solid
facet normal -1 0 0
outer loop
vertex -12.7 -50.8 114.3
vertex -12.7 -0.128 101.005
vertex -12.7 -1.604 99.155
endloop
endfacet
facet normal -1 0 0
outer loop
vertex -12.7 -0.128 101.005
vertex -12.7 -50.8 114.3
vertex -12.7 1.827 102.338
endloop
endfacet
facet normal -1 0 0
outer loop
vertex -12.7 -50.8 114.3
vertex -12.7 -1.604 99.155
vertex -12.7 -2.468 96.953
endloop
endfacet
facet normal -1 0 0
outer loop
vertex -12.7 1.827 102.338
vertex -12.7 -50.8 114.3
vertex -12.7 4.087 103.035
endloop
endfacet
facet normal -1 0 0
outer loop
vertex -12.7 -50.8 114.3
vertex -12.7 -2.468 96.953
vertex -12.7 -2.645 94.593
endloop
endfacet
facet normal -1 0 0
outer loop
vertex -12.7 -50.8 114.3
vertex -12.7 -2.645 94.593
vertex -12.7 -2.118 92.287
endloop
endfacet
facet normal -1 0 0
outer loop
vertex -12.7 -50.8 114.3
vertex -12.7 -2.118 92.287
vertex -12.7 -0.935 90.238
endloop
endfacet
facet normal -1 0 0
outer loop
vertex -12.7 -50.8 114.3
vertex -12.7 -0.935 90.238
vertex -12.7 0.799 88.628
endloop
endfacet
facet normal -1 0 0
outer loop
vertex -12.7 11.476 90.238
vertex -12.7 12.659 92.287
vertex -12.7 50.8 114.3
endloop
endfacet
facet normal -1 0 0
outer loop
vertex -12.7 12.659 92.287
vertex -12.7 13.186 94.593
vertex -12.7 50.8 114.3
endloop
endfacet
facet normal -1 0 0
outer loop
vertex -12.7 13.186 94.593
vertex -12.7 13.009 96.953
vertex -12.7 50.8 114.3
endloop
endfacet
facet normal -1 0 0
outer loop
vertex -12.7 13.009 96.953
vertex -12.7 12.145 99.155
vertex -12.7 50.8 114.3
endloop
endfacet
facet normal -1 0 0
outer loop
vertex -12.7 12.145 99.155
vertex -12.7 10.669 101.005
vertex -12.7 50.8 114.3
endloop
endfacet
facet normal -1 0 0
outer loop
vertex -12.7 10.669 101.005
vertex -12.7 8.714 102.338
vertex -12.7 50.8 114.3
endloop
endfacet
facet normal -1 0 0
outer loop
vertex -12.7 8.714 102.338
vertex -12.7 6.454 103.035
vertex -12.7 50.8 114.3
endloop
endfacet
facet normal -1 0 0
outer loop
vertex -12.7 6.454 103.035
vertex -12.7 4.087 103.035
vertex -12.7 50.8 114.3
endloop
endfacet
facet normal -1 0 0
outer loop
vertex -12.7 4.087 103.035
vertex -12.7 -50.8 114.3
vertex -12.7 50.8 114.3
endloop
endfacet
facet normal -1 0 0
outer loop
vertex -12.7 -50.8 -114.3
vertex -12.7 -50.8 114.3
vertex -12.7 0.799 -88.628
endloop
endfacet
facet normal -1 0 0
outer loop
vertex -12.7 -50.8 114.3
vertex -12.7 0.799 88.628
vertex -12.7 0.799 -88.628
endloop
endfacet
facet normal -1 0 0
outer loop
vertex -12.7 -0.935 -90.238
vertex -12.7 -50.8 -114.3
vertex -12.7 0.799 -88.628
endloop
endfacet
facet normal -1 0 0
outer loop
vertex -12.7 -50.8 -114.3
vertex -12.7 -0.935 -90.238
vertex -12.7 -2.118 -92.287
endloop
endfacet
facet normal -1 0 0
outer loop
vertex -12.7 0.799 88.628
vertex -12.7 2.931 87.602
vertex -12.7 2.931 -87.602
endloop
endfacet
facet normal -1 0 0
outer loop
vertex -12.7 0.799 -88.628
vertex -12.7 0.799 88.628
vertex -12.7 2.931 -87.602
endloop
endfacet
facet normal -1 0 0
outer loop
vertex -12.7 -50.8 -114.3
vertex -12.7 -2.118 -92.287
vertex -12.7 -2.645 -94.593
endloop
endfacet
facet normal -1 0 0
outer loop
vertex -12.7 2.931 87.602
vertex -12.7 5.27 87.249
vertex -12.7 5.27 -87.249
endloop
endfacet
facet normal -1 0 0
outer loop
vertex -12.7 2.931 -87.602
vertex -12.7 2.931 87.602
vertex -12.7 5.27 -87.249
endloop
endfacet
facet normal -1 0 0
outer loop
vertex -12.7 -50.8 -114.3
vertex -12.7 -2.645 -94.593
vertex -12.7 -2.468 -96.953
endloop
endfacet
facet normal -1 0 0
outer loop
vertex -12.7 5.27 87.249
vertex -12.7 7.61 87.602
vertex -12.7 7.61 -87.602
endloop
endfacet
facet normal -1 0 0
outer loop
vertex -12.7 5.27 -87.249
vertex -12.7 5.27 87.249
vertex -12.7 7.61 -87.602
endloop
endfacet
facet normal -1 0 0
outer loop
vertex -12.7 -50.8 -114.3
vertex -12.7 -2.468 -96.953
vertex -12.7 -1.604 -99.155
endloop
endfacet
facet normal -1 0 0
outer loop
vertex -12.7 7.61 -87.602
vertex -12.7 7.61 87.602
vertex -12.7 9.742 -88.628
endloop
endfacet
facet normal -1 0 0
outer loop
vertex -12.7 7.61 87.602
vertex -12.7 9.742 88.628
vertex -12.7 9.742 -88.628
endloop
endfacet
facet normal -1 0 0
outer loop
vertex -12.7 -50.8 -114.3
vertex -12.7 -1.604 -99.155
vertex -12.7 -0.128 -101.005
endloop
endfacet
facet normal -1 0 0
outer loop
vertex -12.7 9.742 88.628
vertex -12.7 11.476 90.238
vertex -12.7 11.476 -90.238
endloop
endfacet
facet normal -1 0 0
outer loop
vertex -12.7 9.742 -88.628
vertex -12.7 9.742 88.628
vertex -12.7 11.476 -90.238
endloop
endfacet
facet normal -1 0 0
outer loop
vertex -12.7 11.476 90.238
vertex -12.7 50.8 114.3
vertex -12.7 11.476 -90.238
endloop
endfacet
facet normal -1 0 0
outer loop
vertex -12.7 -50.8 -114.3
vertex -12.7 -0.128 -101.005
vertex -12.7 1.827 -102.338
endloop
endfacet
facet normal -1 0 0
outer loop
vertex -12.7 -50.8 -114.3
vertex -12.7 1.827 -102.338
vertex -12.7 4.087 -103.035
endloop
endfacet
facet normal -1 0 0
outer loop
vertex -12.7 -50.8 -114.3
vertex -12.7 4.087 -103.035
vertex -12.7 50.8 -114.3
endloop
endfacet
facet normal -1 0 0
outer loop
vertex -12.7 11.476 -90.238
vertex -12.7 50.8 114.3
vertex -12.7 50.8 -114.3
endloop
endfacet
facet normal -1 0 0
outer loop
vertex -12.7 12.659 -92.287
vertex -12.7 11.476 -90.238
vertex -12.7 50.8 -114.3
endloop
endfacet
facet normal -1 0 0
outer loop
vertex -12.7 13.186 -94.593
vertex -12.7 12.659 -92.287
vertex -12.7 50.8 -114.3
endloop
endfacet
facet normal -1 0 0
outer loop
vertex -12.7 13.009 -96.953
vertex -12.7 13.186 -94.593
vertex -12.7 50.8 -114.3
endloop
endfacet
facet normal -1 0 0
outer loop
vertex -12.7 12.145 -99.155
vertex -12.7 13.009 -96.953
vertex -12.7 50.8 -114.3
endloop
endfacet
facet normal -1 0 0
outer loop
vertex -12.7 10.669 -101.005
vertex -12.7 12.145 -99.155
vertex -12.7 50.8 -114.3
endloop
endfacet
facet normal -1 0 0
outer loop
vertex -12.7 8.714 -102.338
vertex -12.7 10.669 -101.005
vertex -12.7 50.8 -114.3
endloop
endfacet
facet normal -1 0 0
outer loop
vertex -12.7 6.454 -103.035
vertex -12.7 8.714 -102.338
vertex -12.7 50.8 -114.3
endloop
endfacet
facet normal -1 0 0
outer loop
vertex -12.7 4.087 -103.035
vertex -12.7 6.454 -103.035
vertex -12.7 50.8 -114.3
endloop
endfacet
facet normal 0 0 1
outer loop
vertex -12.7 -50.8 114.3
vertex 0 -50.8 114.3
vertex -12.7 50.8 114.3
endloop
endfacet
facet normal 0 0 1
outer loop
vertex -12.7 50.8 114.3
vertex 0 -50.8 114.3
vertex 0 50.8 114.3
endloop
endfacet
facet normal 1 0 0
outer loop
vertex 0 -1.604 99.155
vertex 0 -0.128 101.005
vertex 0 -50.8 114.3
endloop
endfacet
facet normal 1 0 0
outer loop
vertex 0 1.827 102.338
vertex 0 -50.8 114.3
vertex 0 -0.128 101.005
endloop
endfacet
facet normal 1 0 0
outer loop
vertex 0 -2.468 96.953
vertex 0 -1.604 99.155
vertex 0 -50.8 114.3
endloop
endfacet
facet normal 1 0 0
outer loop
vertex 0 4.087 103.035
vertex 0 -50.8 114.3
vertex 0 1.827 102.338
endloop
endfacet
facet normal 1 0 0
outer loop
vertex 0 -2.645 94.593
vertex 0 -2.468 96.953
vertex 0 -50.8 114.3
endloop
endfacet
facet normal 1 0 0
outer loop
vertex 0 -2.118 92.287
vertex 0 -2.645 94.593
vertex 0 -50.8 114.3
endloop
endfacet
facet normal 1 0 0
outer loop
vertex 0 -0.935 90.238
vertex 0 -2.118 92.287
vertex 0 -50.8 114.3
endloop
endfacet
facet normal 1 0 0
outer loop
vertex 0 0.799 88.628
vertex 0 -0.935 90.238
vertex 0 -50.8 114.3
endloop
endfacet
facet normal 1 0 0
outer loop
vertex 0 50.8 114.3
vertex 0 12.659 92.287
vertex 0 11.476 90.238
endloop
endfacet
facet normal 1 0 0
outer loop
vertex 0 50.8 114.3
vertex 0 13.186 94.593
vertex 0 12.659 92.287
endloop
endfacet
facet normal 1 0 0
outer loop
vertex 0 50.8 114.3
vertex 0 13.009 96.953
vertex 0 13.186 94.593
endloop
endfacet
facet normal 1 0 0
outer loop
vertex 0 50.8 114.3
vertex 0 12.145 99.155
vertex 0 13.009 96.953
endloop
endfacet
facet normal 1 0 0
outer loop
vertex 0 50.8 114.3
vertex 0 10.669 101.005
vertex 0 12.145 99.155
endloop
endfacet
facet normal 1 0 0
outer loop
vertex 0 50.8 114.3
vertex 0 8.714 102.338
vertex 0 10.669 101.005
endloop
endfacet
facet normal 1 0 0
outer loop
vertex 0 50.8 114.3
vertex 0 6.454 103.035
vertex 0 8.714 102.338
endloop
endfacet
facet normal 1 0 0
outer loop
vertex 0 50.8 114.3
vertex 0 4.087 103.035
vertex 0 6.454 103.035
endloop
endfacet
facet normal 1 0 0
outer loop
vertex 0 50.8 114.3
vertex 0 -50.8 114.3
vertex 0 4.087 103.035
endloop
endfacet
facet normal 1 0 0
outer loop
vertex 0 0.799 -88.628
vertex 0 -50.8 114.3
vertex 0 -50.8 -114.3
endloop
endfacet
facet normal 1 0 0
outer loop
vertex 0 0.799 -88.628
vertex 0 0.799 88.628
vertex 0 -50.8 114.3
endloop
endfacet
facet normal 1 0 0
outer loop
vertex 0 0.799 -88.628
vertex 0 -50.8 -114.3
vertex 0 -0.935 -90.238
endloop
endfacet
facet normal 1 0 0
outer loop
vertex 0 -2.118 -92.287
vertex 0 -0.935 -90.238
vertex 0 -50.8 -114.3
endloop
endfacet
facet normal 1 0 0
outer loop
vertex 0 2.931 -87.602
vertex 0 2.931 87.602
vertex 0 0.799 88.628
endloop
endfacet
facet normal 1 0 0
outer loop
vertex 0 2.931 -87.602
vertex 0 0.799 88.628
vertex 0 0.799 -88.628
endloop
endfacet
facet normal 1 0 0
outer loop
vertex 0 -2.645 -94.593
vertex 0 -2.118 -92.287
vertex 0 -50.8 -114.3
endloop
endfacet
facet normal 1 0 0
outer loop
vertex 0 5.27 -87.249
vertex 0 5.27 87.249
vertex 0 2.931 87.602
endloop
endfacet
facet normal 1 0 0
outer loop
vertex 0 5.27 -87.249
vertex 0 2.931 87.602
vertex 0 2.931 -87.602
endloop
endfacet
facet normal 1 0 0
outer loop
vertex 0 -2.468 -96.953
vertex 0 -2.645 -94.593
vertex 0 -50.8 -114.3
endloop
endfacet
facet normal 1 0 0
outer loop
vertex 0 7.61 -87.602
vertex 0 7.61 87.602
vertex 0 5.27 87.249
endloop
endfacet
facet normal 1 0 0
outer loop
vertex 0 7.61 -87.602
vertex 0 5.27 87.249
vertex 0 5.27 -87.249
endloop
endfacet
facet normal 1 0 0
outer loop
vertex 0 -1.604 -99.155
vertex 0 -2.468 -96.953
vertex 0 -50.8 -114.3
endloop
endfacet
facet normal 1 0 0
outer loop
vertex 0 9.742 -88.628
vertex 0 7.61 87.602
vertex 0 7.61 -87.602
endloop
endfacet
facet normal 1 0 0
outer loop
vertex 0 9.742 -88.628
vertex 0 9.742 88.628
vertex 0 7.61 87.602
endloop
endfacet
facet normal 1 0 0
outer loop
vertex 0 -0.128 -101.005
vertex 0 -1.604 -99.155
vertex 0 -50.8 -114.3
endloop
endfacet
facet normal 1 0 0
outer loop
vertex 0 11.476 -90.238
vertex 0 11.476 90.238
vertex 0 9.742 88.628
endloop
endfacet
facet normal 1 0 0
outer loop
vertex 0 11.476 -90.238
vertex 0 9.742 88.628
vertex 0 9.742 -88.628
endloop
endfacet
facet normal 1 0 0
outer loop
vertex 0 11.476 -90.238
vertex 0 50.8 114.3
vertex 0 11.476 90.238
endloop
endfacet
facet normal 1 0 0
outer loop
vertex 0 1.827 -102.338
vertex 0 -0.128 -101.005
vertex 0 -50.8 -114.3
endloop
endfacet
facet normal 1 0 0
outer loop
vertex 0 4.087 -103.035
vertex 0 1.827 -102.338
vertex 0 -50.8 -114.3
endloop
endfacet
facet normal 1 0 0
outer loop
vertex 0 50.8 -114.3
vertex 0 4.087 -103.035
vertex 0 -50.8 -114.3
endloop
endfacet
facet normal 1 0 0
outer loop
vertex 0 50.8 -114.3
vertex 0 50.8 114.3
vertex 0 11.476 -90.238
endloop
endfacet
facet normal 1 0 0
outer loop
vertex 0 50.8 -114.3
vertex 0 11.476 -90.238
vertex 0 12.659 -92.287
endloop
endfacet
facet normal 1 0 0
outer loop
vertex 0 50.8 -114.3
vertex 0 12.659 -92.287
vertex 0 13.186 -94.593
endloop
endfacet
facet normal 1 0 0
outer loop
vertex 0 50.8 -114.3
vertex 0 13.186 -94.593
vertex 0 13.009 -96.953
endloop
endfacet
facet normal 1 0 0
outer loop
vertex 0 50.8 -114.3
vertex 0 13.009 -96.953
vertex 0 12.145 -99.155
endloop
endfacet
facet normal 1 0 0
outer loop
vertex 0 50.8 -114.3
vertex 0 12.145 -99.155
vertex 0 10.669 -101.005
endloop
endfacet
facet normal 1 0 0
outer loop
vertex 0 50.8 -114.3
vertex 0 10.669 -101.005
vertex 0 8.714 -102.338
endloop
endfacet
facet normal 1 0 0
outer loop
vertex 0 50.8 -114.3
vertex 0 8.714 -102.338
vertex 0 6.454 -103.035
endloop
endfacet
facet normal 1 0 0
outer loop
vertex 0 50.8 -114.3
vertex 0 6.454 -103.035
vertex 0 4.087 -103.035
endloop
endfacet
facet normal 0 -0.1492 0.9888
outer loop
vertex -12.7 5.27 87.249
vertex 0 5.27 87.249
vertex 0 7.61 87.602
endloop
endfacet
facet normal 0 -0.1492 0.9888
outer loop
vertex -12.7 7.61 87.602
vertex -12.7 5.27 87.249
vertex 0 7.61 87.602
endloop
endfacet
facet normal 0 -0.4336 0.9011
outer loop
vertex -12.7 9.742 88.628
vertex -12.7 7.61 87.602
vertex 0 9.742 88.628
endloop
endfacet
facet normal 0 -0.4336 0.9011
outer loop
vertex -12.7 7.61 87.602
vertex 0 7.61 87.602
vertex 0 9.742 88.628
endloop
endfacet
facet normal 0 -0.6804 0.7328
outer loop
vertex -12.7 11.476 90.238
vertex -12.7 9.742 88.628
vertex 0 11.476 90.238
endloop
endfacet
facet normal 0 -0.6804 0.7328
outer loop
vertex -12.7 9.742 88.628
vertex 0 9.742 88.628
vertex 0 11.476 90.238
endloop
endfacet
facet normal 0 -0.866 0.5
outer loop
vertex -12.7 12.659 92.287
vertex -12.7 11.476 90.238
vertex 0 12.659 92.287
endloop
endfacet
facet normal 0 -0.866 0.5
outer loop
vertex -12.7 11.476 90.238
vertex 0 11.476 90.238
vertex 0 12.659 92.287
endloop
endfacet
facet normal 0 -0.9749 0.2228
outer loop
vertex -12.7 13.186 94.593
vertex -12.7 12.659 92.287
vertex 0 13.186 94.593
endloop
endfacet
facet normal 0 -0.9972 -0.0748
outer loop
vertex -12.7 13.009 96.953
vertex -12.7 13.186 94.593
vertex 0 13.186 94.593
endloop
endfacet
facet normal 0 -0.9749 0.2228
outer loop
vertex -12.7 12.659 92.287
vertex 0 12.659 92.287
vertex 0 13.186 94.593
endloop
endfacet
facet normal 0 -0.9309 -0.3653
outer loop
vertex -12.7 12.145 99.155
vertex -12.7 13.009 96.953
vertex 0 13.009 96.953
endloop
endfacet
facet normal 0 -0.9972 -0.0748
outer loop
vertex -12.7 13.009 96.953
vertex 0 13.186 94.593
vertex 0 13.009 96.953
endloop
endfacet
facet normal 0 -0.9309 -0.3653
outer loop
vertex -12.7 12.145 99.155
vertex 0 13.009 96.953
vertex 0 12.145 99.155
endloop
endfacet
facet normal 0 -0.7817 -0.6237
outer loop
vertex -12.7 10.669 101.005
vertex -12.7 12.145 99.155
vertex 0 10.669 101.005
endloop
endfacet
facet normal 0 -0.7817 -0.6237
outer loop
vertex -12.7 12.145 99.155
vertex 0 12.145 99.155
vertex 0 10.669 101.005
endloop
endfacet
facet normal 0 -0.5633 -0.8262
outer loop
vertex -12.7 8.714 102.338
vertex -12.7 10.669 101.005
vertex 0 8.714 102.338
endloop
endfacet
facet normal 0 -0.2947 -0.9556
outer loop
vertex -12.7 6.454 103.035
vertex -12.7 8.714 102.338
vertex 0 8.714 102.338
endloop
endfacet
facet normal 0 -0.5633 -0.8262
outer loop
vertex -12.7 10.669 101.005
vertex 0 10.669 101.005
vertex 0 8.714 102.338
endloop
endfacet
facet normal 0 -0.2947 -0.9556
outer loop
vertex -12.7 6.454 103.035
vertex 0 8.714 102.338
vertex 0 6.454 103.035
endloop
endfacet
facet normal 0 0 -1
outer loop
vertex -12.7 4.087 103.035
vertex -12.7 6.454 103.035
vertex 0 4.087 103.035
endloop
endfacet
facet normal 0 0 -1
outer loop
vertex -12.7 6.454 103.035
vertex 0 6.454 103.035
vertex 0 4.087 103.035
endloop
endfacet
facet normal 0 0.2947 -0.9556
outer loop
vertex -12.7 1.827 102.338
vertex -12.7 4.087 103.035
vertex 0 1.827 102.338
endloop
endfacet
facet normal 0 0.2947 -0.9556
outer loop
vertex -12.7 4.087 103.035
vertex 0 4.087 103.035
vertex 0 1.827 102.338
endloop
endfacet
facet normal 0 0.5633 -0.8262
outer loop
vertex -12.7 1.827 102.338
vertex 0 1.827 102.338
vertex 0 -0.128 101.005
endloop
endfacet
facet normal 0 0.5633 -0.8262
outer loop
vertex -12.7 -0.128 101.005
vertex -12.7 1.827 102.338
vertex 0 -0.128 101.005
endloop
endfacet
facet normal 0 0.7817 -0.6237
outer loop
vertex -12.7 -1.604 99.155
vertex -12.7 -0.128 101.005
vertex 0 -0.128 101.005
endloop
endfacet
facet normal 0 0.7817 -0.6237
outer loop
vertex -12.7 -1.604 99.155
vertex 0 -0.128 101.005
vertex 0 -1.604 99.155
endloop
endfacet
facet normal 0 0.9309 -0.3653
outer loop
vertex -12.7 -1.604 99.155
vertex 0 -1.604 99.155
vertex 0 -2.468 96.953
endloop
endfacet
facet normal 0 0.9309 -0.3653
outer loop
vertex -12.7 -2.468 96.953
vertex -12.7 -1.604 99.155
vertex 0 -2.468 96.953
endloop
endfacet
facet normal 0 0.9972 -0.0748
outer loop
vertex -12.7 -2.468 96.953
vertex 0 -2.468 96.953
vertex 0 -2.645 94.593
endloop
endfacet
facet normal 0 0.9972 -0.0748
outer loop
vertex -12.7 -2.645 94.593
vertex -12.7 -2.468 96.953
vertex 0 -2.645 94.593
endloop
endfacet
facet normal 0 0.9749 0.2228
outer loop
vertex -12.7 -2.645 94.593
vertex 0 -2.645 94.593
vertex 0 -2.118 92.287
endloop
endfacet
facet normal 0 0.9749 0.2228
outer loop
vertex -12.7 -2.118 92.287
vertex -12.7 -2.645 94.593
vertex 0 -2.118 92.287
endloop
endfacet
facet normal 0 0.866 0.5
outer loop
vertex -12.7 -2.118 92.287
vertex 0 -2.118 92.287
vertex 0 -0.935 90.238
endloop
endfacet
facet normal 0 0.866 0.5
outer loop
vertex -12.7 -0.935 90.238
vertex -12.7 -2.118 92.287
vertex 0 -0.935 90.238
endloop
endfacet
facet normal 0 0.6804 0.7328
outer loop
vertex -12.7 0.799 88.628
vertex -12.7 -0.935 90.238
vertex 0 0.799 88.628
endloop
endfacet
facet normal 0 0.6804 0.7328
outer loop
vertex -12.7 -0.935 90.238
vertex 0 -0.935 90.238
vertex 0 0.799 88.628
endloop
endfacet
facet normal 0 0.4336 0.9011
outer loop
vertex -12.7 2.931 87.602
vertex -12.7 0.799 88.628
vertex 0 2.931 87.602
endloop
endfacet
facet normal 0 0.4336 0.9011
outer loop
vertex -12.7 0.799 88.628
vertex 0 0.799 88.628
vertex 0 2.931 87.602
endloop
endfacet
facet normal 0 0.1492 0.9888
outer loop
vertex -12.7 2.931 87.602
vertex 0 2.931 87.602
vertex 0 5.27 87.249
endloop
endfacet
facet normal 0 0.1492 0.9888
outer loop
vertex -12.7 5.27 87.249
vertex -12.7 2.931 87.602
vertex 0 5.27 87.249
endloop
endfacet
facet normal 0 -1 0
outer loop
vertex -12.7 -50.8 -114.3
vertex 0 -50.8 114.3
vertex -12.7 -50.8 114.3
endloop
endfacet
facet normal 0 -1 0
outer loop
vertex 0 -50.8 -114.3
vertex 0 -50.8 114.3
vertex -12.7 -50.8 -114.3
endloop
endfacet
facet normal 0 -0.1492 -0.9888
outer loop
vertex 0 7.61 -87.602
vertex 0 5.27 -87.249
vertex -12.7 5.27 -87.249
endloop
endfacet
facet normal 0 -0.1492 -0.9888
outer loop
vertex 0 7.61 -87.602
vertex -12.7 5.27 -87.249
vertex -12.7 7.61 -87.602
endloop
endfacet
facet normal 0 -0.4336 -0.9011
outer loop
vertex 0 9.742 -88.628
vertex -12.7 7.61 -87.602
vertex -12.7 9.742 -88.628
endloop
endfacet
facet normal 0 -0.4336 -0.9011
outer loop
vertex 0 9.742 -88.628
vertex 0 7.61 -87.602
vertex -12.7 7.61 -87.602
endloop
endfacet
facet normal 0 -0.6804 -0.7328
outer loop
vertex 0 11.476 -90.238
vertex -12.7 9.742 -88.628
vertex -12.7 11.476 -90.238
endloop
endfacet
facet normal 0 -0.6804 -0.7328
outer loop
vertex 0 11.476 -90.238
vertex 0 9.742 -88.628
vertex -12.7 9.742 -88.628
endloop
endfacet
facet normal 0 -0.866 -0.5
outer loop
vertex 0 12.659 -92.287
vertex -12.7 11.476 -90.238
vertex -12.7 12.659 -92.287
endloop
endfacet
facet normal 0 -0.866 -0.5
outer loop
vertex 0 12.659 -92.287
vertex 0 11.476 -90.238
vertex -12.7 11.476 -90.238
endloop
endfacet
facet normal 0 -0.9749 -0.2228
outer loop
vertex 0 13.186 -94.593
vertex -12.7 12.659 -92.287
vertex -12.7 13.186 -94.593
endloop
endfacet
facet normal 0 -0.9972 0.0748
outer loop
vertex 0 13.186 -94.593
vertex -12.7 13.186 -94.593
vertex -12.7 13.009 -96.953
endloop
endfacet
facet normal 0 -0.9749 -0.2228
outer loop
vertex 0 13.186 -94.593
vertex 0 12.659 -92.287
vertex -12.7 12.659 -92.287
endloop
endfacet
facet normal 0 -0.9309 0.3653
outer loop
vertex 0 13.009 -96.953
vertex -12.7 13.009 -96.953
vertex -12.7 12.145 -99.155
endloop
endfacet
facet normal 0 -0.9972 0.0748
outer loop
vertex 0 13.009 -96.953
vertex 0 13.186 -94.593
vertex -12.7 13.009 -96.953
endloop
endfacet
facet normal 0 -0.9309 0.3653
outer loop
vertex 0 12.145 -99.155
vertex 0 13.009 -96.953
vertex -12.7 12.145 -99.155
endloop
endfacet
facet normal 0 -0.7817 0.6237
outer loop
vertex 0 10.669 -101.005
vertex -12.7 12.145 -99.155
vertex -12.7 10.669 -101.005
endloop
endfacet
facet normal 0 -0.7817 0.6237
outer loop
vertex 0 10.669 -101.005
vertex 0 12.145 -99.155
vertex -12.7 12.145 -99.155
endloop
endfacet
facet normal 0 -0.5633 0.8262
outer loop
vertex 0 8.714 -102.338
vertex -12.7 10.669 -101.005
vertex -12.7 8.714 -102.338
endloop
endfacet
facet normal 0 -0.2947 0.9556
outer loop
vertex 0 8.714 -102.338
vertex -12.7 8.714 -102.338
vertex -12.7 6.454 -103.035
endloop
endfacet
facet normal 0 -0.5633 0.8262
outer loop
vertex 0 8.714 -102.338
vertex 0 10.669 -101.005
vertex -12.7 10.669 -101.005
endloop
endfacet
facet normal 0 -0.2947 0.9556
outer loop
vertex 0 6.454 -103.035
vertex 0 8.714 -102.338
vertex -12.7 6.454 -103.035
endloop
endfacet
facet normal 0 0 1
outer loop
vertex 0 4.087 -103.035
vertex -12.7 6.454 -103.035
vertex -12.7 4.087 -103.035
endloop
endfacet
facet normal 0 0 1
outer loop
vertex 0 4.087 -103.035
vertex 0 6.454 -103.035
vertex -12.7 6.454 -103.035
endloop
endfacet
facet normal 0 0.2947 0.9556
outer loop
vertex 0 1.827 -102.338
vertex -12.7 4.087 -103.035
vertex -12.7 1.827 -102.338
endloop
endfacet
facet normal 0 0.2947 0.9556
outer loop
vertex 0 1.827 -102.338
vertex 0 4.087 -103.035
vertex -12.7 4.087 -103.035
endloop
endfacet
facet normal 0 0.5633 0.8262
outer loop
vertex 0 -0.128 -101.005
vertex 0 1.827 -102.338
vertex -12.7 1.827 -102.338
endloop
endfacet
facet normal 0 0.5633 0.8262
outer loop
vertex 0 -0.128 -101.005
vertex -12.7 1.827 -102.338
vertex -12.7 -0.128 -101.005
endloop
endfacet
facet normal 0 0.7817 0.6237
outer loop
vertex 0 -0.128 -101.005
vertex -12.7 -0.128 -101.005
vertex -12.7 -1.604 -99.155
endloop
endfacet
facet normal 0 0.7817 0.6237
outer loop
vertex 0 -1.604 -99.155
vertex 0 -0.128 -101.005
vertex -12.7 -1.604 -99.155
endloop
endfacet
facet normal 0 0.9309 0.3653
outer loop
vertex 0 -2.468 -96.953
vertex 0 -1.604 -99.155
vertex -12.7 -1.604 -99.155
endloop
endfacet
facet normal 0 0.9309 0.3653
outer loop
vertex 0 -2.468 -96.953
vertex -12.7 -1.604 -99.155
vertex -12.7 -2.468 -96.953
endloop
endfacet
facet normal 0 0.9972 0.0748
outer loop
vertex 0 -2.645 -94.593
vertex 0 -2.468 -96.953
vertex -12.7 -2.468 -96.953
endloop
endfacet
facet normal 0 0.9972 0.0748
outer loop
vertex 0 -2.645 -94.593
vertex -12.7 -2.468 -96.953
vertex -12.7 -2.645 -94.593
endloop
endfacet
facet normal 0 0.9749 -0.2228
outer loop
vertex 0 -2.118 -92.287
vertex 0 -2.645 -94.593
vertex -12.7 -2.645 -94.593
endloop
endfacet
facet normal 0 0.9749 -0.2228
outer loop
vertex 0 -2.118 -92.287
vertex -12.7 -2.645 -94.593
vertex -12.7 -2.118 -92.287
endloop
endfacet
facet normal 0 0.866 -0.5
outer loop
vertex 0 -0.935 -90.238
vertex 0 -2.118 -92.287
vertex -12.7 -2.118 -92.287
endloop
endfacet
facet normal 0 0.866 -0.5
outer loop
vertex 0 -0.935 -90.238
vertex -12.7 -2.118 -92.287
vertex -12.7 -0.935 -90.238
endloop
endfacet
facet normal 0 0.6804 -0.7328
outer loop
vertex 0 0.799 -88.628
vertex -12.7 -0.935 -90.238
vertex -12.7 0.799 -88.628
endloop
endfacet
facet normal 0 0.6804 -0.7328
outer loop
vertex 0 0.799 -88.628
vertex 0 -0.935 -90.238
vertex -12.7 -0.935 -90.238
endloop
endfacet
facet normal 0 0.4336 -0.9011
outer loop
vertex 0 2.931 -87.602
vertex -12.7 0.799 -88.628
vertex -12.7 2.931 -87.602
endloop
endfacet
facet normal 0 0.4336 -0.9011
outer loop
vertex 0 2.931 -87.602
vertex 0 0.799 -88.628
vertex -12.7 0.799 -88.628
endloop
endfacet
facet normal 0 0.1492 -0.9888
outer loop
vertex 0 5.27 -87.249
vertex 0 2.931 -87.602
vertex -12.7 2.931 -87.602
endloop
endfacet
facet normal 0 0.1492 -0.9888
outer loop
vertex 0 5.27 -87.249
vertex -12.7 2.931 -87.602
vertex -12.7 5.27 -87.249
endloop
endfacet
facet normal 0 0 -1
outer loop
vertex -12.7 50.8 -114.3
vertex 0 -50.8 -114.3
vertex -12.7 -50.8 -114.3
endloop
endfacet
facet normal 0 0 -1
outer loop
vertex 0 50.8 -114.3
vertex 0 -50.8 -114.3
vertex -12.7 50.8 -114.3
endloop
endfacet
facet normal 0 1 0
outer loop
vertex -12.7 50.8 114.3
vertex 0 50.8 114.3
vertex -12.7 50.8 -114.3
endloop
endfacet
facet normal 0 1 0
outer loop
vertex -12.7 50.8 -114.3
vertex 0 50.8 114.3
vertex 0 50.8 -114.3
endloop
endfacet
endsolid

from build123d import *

# Parameters (mm, degrees)
SKETCH1_W           = 228.6
SKETCH1_H           = 101.6
BOSS_EXTRUDE1_DEPTH = 12.7
SKETCH2_R           = 7.9375
CUT_EXTRUDE1_DEPTH  = 12.7


with BuildPart() as part:
    # Sketch1 → Boss-Extrude1 (new body)
    with BuildSketch(Plane(origin=(0, 0, 0), x_dir=(0, 0, -1), z_dir=(1, 0, 0))):
        Rectangle(SKETCH1_W, SKETCH1_H)
    extrude(amount=-BOSS_EXTRUDE1_DEPTH)

    # Sketch2 → Cut-Extrude1 (cut)
    with BuildSketch(Plane(origin=(0, 0, 0), x_dir=(0, 0, -1), z_dir=(1, 0, 0))):
        with Locations((-95.1865, 5.2705)):
            Circle(SKETCH2_R)
    cut_extrude1 = extrude(amount=-CUT_EXTRUDE1_DEPTH, mode=Mode.SUBTRACT)

    # Mirror1: Cut-Extrude1 across plane
    add(cut_extrude1.mirror(Plane.XY), mode=Mode.SUBTRACT)


solid = part.part
